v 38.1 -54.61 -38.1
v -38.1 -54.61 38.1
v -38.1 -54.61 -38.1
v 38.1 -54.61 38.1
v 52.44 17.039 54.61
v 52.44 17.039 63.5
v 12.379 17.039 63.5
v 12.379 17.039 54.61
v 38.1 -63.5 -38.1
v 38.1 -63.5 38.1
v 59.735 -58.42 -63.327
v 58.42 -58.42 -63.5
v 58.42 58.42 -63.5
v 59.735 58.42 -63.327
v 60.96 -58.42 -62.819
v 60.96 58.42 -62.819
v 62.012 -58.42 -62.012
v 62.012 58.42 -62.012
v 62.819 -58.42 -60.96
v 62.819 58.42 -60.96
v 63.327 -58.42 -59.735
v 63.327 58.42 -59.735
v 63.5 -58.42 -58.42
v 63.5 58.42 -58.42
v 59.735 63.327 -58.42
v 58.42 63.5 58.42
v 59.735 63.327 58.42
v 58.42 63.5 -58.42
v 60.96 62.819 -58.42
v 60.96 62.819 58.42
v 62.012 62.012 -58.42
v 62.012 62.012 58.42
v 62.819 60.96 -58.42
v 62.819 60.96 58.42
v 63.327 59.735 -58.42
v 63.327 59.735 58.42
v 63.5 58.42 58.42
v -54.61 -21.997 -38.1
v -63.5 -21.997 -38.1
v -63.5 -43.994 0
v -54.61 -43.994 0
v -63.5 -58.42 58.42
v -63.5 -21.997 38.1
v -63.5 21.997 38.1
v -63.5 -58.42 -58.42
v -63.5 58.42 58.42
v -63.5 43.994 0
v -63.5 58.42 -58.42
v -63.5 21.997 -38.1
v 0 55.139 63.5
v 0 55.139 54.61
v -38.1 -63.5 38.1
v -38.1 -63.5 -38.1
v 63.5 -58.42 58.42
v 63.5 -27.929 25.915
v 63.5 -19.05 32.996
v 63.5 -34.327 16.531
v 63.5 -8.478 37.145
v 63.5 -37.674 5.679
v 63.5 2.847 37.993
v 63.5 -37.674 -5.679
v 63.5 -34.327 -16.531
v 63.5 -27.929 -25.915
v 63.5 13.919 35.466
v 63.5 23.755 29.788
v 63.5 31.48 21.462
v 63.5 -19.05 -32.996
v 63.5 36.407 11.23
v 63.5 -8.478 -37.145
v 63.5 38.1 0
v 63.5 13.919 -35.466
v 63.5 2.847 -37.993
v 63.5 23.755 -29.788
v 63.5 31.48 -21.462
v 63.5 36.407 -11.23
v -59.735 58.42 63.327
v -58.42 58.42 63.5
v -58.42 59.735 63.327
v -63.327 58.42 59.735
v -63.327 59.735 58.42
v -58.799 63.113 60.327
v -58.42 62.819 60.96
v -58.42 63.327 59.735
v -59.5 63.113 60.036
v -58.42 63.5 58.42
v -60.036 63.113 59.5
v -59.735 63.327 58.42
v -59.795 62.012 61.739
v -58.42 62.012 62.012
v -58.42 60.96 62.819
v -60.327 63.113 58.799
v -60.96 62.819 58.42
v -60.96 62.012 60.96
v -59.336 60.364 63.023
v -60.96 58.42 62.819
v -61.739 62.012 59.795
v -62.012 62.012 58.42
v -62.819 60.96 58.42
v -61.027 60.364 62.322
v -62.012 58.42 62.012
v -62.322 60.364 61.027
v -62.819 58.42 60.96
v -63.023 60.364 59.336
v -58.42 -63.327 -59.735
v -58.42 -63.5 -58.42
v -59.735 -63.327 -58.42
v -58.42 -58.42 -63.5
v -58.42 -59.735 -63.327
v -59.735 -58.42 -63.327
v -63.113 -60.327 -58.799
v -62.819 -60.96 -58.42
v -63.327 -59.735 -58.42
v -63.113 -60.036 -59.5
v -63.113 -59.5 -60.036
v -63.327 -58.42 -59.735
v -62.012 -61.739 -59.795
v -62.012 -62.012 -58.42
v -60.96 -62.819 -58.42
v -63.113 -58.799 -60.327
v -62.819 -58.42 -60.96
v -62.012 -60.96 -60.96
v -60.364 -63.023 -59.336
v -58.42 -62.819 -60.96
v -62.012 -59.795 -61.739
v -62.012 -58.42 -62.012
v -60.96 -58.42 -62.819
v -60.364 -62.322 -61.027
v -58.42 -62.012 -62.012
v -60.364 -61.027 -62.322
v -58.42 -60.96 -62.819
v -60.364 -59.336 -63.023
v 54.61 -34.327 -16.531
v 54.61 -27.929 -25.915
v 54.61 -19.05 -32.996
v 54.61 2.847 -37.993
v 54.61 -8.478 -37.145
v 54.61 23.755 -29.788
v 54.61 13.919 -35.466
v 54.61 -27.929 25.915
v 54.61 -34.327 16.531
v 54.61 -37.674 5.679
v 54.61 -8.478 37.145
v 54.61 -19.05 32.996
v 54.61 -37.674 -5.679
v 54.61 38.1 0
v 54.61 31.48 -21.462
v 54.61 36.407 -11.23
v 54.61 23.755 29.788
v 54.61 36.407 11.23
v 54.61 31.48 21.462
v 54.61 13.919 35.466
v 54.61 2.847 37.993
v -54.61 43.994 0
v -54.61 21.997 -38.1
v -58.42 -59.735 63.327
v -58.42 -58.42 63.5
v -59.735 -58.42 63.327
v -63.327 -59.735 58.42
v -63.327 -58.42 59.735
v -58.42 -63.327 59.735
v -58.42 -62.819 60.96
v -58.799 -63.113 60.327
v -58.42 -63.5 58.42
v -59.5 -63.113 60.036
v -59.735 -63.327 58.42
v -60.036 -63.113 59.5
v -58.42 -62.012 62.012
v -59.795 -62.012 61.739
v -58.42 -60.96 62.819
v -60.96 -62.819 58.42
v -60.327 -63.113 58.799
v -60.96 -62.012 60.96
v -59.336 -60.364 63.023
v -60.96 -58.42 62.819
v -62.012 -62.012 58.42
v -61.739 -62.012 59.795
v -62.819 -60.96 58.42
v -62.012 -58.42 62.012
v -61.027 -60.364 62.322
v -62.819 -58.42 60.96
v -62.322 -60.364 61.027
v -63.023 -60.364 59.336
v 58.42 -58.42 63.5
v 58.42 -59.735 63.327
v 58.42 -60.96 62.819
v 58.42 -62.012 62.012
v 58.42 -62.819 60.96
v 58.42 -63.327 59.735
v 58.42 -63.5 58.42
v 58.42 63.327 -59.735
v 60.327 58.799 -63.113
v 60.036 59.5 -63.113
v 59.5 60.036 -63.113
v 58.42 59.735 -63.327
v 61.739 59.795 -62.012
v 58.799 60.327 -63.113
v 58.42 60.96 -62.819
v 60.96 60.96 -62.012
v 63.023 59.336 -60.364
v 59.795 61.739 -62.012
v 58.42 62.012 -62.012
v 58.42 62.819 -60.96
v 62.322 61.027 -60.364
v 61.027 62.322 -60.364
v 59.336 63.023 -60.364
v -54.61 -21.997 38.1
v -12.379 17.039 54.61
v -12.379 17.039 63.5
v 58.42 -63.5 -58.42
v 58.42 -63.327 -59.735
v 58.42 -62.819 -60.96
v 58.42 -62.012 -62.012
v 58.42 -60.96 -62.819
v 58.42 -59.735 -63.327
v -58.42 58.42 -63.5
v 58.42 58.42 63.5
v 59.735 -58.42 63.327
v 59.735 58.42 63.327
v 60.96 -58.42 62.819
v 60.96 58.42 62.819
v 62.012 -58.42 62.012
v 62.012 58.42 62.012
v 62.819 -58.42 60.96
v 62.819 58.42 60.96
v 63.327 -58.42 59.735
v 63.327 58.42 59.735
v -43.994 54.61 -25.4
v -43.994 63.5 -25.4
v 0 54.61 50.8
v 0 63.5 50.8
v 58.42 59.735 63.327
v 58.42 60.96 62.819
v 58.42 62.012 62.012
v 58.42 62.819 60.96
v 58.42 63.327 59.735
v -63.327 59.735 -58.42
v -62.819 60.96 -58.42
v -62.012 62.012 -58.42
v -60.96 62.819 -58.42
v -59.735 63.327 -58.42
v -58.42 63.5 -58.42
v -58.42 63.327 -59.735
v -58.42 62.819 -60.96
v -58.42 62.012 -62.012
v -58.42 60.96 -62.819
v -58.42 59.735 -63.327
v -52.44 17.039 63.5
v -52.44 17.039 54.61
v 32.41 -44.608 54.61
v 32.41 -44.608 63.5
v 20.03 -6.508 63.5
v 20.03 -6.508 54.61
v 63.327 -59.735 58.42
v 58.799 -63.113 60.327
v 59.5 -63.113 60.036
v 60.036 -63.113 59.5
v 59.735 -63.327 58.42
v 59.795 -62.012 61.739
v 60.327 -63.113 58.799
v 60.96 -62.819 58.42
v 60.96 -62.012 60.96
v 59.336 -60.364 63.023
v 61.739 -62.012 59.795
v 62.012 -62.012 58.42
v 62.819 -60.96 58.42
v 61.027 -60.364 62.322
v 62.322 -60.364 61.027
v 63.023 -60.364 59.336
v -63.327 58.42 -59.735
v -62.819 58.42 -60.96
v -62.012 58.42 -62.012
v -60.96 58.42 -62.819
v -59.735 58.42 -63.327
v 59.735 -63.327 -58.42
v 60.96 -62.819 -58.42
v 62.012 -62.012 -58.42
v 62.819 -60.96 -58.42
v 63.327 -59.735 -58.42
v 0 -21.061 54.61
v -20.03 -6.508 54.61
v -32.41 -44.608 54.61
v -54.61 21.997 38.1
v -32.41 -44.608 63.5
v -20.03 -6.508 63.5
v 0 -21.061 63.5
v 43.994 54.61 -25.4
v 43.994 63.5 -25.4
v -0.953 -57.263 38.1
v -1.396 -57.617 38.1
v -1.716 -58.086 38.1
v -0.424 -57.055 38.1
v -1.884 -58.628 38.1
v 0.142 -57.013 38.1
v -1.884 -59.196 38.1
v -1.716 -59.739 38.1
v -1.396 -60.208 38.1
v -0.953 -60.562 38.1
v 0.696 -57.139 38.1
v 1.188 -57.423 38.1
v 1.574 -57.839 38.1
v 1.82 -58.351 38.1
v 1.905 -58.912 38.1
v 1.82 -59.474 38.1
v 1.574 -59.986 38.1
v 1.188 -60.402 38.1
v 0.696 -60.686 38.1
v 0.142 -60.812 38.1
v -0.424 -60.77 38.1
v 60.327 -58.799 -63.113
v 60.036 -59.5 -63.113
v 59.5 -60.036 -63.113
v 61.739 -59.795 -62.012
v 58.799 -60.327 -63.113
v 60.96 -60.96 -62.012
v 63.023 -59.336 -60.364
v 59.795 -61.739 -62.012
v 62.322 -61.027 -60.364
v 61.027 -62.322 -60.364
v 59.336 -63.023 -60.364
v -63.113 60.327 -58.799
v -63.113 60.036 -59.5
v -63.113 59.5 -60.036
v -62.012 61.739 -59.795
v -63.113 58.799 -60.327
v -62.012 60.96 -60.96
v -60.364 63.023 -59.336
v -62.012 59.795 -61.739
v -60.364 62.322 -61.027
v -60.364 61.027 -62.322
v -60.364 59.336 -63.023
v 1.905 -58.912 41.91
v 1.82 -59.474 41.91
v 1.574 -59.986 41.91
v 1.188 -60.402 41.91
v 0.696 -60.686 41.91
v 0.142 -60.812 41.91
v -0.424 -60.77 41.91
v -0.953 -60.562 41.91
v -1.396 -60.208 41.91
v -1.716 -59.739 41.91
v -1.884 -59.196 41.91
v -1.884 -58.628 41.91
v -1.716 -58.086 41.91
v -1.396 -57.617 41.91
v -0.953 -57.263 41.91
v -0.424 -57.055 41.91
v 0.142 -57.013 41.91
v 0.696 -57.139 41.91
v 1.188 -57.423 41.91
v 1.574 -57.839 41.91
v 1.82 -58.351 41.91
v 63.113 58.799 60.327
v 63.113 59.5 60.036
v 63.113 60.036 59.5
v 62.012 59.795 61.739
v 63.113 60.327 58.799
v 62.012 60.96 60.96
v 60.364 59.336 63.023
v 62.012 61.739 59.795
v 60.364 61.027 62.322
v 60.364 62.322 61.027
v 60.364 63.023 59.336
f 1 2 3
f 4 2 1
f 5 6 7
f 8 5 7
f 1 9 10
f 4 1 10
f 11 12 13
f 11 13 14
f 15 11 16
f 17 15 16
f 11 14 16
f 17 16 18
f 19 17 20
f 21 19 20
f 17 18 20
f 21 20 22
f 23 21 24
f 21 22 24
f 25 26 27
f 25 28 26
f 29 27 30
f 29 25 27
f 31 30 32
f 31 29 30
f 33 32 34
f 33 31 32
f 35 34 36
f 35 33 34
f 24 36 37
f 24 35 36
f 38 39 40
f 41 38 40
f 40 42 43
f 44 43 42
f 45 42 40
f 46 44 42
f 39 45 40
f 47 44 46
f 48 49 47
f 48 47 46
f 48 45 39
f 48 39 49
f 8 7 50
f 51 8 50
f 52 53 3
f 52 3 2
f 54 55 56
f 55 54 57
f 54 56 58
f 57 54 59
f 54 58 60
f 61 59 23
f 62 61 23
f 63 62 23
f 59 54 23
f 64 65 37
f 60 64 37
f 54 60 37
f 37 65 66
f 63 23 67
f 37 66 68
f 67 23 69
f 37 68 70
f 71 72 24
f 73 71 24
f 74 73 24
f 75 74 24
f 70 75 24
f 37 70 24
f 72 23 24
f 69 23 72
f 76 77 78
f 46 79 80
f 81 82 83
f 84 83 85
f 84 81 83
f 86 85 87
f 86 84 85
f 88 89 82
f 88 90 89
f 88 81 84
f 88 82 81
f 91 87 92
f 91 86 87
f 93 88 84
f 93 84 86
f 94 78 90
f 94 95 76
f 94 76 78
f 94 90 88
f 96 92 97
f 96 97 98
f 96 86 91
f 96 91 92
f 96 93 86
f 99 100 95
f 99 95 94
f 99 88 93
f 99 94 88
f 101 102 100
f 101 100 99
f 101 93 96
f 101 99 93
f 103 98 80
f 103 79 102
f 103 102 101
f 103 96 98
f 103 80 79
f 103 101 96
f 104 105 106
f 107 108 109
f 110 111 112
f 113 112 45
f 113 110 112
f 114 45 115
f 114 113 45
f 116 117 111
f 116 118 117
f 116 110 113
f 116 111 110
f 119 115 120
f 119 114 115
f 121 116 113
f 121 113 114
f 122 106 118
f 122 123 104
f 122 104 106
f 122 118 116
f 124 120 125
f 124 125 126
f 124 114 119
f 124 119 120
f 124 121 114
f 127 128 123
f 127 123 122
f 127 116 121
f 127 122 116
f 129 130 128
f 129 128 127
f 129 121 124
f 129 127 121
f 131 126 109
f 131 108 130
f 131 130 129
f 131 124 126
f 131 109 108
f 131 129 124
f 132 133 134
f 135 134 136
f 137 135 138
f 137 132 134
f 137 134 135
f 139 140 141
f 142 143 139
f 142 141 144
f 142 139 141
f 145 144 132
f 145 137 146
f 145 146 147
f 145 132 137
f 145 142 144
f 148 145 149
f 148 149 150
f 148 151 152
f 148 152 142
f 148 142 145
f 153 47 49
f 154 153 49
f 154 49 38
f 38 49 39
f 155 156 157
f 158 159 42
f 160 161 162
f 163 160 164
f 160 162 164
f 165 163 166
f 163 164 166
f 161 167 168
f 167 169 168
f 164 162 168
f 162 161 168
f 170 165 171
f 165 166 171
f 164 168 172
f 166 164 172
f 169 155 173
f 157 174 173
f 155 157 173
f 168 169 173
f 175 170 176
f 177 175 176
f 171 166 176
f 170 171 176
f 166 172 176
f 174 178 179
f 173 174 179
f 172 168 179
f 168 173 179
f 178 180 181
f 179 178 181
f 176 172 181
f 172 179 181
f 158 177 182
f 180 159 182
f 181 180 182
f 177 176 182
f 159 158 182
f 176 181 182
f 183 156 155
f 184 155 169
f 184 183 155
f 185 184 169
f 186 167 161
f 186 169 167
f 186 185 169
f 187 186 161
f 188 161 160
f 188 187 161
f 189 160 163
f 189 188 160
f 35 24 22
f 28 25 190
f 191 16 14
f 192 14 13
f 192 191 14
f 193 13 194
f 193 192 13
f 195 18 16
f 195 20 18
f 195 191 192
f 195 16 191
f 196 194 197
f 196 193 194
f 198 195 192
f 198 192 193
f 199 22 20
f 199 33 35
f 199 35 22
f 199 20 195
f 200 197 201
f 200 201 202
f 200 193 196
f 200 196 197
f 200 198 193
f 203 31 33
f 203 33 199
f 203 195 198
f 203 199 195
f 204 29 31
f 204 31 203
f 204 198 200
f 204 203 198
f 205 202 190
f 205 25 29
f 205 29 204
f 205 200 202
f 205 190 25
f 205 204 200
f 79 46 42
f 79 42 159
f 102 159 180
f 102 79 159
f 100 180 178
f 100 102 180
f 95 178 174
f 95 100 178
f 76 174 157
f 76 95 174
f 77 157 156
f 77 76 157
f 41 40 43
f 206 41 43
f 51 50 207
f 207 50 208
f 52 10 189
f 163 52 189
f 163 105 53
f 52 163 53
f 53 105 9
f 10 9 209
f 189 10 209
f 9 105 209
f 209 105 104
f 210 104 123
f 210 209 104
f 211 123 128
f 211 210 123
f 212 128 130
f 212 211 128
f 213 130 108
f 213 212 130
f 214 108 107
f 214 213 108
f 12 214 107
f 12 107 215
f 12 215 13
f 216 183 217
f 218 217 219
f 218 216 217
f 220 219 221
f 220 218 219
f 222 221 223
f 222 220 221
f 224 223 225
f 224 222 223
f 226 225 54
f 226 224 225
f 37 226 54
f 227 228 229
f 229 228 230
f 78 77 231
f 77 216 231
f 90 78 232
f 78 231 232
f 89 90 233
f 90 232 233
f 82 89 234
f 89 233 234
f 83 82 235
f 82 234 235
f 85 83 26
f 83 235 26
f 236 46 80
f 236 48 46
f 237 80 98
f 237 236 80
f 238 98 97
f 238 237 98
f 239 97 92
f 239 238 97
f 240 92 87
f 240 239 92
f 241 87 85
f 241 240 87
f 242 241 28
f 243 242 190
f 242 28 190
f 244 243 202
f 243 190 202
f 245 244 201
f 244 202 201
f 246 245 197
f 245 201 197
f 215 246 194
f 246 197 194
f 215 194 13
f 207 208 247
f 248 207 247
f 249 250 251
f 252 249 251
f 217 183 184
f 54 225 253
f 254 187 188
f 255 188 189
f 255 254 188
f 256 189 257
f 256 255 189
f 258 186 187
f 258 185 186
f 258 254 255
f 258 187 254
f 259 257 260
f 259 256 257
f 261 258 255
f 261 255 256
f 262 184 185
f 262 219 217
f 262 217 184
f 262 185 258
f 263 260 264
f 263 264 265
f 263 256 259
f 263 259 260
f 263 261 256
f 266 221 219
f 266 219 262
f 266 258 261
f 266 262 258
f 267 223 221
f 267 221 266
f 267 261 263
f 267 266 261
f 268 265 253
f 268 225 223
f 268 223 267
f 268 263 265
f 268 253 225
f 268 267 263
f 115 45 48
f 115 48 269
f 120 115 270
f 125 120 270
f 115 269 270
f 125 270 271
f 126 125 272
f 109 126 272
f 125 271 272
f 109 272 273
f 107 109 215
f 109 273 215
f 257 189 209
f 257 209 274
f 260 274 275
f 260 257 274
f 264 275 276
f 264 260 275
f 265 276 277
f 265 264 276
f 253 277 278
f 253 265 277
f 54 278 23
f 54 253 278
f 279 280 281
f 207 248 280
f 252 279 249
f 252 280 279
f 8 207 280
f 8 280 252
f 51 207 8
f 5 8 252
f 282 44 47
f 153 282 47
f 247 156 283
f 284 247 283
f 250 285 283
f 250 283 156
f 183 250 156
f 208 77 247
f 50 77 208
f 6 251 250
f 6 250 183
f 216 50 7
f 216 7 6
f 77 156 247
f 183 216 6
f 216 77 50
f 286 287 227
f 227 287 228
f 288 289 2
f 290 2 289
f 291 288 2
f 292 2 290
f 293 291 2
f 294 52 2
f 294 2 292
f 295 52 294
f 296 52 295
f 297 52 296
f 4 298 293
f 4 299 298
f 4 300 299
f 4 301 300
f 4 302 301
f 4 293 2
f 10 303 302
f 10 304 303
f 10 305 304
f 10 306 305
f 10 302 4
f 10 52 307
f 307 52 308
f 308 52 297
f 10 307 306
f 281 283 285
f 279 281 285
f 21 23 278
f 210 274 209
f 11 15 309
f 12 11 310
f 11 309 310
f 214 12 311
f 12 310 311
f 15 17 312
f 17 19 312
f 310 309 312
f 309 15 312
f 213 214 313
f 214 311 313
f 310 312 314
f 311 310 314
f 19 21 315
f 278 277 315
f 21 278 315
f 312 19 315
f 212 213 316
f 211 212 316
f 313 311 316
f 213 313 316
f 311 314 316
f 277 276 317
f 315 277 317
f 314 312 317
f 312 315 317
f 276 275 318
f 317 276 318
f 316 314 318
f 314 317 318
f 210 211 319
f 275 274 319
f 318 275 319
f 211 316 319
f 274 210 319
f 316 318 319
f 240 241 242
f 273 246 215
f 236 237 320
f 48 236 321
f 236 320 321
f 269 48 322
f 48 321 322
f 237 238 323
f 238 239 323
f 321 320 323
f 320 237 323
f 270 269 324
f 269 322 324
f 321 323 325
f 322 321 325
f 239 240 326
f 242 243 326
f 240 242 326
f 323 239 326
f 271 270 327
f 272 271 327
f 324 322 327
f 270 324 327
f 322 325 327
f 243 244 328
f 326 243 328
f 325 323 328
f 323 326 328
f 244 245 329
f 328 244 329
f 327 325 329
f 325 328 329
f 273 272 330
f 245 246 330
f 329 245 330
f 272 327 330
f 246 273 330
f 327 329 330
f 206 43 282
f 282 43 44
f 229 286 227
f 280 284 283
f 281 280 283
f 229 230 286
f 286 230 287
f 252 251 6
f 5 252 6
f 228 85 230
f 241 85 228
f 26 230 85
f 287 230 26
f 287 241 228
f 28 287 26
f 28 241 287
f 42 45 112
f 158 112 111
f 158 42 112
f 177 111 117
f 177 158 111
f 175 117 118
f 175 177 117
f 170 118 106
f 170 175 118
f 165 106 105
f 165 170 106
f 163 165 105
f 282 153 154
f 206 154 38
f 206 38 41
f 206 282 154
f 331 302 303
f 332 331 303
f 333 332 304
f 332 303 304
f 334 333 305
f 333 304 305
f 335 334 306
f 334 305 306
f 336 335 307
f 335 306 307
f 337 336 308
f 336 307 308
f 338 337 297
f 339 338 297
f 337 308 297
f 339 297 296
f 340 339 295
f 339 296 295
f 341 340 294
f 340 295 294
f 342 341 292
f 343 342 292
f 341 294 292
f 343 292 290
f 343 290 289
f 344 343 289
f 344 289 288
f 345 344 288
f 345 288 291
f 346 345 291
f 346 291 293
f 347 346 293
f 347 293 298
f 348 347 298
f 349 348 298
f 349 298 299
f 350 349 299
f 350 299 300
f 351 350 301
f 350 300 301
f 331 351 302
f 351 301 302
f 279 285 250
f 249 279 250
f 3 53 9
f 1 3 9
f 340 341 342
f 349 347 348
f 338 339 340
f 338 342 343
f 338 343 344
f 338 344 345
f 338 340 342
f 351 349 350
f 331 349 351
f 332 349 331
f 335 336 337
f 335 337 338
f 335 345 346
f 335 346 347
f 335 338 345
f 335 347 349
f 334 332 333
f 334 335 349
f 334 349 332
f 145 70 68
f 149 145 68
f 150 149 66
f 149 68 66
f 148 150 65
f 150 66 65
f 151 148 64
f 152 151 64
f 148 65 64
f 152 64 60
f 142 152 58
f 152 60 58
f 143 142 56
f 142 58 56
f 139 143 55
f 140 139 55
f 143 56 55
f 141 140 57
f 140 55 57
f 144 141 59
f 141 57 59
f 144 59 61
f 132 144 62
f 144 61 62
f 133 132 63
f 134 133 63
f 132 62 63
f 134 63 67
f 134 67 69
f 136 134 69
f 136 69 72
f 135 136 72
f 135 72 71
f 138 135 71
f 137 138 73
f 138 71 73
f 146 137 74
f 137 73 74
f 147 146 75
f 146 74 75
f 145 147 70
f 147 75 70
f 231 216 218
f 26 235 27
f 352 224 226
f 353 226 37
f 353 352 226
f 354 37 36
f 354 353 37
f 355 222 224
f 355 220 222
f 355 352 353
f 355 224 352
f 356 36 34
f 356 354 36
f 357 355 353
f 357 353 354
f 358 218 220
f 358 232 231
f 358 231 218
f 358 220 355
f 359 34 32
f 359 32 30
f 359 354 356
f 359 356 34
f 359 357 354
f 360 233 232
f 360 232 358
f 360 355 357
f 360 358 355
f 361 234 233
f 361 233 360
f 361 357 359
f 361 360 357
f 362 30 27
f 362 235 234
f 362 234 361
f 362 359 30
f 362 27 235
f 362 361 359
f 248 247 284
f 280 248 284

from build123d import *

# Parameters (mm, degrees)
F0_W      = 127
F0_H      = 127
F1_DEPTH  = 63.5
F1_FACE_W = 127
F1_FACE_H = 127
F2_DEPTH  = 63.5
F3_W      = 76.2
F3_H      = 76.2
F4_DEPTH  = 8.89
F5_R      = 38.1
F6_DEPTH  = 8.89
F8_DEPTH  = 8.89
F10_DEPTH = 8.89
F12_DEPTH = 8.89
F13_R     = 5.08
F14_R     = 1.905
F15_DEPTH = 3.81


with BuildPart() as f1:
    # F0 (on Top) → F1 (new body)
    with BuildSketch(Plane.XY):
        Rectangle(F0_W, F0_H)
    extrude(amount=-F1_DEPTH)

    # F1_face (on face) → F2 (join)
    with BuildSketch(Plane.XY):
        Rectangle(F1_FACE_W, F1_FACE_H)
    extrude(amount=F2_DEPTH)

    # F3 (on face) → F4 (cut)
    with BuildSketch(Plane.XZ.offset(63.5)):
        Rectangle(F3_W, F3_H)
    extrude(amount=-F4_DEPTH, mode=Mode.SUBTRACT)

    # F5 (on face) → F6 (cut)
    with BuildSketch(Plane.YZ.offset(63.5)):
        Circle(F5_R)
    extrude(amount=-F6_DEPTH, mode=Mode.SUBTRACT)

    # F7 (on face) → F8 (cut)
    with BuildSketch(Plane(origin=(0, 63.5, 0), x_dir=(-1, 0, 0), z_dir=(0, 1, 0))):
        Polygon((-43.994091, -25.4), (43.994091, -25.4), (0, 50.8), align=None)
    extrude(amount=-F8_DEPTH, mode=Mode.SUBTRACT)

    # F9 (on face) → F10 (cut)
    with BuildSketch(Plane(origin=(-63.5, 0, 0), x_dir=(0, -1, 0), z_dir=(-1, 0, 0))):
        Polygon((21.997045, 38.1), (-21.997045, 38.1), (-43.994091, 0), (-21.997045, -38.1), (21.997045, -38.1), (43.994091, 0), align=None)
    extrude(amount=-F10_DEPTH, mode=Mode.SUBTRACT)

    # F11 (on face) → F12 (cut)
    with BuildSketch(Plane.XY.offset(63.5)):
        Polygon((0, 55.138838), (-12.37944, 17.038838), (-52.440151, 17.038838), (-20.030355, -6.508257), (-32.409796, -44.608257), (0, -21.061162), (32.409796, -44.608257), (20.030355, -6.508257), (52.440151, 17.038838), (12.37944, 17.038838), align=None)
    extrude(amount=-F12_DEPTH, mode=Mode.SUBTRACT)

    # F13
    f13_edges = [f1.edges().sort_by_distance(p)[0] for p in [
        (-63.5, 0, 63.5),
        (0, 63.5, 63.5),
        (63.5, 0, 63.5),
        (0, -63.5, 63.5),
        (63.5, -63.5, 0),
        (63.5, 63.5, 0),
        (63.5, 0, -63.5),
        (0, -63.5, -63.5),
        (-63.5, -63.5, 0),
        (0, 63.5, -63.5),
        (-63.5, 63.5, 0),
        (-63.5, 0, -63.5),
    ]]
    fillet(f13_edges, radius=F13_R)

    # F14 (on face) → F15 (cut)
    with BuildSketch(Plane(origin=(0, 0, 38.1), x_dir=(1, 0, 0), z_dir=(0, 0, -1))):
        with Locations((0, 58.912385)):
            Circle(F14_R)
    extrude(amount=-F15_DEPTH, mode=Mode.SUBTRACT)


solid = f1.part
